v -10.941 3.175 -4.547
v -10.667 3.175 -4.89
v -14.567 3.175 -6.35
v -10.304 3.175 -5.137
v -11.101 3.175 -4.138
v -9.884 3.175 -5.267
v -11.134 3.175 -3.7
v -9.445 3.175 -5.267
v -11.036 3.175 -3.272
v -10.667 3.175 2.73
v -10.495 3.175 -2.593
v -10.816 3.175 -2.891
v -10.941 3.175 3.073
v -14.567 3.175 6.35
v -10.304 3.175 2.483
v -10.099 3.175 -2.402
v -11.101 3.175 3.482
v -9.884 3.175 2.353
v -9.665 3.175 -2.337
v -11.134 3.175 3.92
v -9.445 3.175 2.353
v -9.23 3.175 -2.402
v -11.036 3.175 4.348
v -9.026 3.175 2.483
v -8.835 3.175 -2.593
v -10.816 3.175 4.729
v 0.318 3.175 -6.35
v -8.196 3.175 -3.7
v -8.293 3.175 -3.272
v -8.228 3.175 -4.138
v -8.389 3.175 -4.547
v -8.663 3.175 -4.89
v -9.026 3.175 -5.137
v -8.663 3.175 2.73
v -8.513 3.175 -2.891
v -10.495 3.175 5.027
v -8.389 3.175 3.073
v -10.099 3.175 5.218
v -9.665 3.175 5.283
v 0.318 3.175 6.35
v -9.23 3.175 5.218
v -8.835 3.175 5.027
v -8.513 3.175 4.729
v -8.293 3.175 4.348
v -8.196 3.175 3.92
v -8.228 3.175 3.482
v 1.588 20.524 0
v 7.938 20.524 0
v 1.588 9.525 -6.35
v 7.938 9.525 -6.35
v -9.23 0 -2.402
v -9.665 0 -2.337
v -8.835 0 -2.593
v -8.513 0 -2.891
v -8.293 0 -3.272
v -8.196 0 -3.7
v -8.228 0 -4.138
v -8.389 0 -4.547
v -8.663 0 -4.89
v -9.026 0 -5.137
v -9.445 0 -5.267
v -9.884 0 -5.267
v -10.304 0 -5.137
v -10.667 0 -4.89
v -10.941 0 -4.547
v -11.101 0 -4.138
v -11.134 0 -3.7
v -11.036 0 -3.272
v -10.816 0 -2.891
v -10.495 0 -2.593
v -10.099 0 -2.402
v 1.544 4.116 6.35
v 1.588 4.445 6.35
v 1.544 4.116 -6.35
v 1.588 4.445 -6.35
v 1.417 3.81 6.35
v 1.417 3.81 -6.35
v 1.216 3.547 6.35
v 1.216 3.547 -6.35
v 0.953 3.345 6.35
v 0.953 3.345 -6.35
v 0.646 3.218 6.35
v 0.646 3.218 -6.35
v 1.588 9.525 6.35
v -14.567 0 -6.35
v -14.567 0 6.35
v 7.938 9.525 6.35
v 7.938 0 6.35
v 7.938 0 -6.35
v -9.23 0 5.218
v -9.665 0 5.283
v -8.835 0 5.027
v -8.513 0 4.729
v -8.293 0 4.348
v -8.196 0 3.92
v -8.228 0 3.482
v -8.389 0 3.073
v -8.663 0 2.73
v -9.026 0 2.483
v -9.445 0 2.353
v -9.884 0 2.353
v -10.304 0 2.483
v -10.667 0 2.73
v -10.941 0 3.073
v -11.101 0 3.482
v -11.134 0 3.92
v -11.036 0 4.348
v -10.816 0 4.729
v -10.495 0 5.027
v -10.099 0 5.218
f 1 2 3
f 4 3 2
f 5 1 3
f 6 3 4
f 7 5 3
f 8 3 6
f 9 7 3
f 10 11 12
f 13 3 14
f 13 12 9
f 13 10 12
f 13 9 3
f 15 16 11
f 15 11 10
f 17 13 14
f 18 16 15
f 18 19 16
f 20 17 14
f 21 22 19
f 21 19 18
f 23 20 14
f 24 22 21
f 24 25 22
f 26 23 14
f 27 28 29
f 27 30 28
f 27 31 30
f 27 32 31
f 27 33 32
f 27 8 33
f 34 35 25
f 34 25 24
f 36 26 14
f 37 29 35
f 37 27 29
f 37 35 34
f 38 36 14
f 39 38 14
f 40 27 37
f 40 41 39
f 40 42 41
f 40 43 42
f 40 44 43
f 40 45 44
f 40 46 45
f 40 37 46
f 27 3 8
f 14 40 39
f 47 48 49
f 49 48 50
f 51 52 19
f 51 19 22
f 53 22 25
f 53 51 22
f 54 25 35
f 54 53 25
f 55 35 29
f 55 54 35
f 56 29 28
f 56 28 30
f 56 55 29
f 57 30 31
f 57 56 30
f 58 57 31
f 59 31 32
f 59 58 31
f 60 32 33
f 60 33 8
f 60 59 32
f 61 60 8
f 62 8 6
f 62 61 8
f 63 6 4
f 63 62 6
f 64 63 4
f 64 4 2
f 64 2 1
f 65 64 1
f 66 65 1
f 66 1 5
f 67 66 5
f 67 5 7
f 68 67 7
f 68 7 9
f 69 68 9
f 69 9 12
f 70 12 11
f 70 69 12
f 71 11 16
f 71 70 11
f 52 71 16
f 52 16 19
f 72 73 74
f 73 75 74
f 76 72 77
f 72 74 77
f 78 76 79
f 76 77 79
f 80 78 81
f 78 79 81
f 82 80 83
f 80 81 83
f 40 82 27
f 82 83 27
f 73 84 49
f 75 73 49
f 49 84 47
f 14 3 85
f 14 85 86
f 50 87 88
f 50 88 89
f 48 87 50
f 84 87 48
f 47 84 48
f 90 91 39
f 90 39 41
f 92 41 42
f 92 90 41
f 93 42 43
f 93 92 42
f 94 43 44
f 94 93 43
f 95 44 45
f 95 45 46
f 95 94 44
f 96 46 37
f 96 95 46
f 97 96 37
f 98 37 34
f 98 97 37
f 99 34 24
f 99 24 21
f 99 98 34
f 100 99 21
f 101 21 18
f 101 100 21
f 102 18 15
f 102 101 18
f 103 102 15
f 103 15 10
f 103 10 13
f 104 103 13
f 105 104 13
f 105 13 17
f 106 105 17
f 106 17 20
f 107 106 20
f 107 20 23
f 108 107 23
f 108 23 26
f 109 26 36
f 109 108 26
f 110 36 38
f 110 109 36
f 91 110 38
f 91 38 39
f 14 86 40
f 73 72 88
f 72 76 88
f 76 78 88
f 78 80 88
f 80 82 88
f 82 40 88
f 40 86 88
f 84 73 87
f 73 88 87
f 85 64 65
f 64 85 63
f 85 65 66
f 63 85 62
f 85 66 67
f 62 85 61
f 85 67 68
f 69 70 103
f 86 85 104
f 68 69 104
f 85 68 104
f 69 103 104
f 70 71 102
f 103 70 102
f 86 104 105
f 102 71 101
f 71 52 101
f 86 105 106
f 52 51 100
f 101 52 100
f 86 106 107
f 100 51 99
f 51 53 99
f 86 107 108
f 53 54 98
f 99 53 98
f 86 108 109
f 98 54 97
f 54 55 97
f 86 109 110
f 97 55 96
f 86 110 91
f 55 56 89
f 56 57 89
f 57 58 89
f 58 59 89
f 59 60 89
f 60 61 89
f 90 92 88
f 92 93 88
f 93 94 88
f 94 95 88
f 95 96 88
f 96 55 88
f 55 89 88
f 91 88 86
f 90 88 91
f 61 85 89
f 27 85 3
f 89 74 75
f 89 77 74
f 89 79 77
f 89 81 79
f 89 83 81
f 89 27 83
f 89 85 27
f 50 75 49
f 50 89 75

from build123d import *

# Parameters (mm, degrees)
SKETCH1_W           = 3.4544
SKETCH1_H           = 12.7
SKETCH1_R           = 1.4732
SKETCH1_W_2         = 15.875
BOSS_EXTRUDE1_DEPTH = 3.175
SKETCH2_W           = 12.7
SKETCH2_H           = 6.35
BOSS_EXTRUDE2_DEPTH = 6.35
SKETCH3_W           = 12.7
SKETCH3_H           = 3.175
BOSS_EXTRUDE3_DEPTH = 3.175
FILLET1_R           = 1.27


with BuildPart() as part:
    # Sketch1 → Boss-Extrude1 (new body)
    # profile 1 of 2: a face of its own
    with BuildSketch(Plane(origin=(0, 0, 0), x_dir=(1, 0, 0), z_dir=(0, 1, 0))):
        with Locations((-9.6647, 0)):
            Rectangle(SKETCH1_W, SKETCH1_H)
        with Locations(Location((-9.6647, -3.81, 0), (0, 0, 270))):
            Circle(SKETCH1_R, mode=Mode.SUBTRACT)
        with Locations(Location((-9.6647, 3.81, 0), (0, 0, 270))):
            Circle(SKETCH1_R, mode=Mode.SUBTRACT)
    # profile 2 of 2: a face of its own
    with BuildSketch(Plane(origin=(0, 0, 0), x_dir=(1, 0, 0), z_dir=(0, 1, 0))):
        Rectangle(SKETCH1_W_2, SKETCH1_H)
    extrude(amount=BOSS_EXTRUDE1_DEPTH)

    # Sketch2 → Boss-Extrude2 (add)
    with BuildSketch(Plane(origin=(7.9375, 0, 0), x_dir=(0, 0, -1), z_dir=(1, 0, 0))):
        with Locations((0, 6.35)):
            Rectangle(SKETCH2_W, SKETCH2_H)
        Polygon((0, 20.523522628), (6.35, 9.525), (-6.35, 9.525), align=None)
    extrude(amount=-BOSS_EXTRUDE2_DEPTH)

    # Sketch3 → Boss-Extrude3 (add)
    with BuildSketch(Plane.ZY.offset(11.3919)):
        with Locations((0, 1.5875)):
            Rectangle(SKETCH3_W, SKETCH3_H)
    extrude(amount=BOSS_EXTRUDE3_DEPTH)

    # Fillet1
    fillet1_edges = [part.edges().sort_by_distance(p)[0] for p in [
        (1.5875, 3.175, 0),
    ]]
    fillet(fillet1_edges, radius=FILLET1_R)


solid = part.part
